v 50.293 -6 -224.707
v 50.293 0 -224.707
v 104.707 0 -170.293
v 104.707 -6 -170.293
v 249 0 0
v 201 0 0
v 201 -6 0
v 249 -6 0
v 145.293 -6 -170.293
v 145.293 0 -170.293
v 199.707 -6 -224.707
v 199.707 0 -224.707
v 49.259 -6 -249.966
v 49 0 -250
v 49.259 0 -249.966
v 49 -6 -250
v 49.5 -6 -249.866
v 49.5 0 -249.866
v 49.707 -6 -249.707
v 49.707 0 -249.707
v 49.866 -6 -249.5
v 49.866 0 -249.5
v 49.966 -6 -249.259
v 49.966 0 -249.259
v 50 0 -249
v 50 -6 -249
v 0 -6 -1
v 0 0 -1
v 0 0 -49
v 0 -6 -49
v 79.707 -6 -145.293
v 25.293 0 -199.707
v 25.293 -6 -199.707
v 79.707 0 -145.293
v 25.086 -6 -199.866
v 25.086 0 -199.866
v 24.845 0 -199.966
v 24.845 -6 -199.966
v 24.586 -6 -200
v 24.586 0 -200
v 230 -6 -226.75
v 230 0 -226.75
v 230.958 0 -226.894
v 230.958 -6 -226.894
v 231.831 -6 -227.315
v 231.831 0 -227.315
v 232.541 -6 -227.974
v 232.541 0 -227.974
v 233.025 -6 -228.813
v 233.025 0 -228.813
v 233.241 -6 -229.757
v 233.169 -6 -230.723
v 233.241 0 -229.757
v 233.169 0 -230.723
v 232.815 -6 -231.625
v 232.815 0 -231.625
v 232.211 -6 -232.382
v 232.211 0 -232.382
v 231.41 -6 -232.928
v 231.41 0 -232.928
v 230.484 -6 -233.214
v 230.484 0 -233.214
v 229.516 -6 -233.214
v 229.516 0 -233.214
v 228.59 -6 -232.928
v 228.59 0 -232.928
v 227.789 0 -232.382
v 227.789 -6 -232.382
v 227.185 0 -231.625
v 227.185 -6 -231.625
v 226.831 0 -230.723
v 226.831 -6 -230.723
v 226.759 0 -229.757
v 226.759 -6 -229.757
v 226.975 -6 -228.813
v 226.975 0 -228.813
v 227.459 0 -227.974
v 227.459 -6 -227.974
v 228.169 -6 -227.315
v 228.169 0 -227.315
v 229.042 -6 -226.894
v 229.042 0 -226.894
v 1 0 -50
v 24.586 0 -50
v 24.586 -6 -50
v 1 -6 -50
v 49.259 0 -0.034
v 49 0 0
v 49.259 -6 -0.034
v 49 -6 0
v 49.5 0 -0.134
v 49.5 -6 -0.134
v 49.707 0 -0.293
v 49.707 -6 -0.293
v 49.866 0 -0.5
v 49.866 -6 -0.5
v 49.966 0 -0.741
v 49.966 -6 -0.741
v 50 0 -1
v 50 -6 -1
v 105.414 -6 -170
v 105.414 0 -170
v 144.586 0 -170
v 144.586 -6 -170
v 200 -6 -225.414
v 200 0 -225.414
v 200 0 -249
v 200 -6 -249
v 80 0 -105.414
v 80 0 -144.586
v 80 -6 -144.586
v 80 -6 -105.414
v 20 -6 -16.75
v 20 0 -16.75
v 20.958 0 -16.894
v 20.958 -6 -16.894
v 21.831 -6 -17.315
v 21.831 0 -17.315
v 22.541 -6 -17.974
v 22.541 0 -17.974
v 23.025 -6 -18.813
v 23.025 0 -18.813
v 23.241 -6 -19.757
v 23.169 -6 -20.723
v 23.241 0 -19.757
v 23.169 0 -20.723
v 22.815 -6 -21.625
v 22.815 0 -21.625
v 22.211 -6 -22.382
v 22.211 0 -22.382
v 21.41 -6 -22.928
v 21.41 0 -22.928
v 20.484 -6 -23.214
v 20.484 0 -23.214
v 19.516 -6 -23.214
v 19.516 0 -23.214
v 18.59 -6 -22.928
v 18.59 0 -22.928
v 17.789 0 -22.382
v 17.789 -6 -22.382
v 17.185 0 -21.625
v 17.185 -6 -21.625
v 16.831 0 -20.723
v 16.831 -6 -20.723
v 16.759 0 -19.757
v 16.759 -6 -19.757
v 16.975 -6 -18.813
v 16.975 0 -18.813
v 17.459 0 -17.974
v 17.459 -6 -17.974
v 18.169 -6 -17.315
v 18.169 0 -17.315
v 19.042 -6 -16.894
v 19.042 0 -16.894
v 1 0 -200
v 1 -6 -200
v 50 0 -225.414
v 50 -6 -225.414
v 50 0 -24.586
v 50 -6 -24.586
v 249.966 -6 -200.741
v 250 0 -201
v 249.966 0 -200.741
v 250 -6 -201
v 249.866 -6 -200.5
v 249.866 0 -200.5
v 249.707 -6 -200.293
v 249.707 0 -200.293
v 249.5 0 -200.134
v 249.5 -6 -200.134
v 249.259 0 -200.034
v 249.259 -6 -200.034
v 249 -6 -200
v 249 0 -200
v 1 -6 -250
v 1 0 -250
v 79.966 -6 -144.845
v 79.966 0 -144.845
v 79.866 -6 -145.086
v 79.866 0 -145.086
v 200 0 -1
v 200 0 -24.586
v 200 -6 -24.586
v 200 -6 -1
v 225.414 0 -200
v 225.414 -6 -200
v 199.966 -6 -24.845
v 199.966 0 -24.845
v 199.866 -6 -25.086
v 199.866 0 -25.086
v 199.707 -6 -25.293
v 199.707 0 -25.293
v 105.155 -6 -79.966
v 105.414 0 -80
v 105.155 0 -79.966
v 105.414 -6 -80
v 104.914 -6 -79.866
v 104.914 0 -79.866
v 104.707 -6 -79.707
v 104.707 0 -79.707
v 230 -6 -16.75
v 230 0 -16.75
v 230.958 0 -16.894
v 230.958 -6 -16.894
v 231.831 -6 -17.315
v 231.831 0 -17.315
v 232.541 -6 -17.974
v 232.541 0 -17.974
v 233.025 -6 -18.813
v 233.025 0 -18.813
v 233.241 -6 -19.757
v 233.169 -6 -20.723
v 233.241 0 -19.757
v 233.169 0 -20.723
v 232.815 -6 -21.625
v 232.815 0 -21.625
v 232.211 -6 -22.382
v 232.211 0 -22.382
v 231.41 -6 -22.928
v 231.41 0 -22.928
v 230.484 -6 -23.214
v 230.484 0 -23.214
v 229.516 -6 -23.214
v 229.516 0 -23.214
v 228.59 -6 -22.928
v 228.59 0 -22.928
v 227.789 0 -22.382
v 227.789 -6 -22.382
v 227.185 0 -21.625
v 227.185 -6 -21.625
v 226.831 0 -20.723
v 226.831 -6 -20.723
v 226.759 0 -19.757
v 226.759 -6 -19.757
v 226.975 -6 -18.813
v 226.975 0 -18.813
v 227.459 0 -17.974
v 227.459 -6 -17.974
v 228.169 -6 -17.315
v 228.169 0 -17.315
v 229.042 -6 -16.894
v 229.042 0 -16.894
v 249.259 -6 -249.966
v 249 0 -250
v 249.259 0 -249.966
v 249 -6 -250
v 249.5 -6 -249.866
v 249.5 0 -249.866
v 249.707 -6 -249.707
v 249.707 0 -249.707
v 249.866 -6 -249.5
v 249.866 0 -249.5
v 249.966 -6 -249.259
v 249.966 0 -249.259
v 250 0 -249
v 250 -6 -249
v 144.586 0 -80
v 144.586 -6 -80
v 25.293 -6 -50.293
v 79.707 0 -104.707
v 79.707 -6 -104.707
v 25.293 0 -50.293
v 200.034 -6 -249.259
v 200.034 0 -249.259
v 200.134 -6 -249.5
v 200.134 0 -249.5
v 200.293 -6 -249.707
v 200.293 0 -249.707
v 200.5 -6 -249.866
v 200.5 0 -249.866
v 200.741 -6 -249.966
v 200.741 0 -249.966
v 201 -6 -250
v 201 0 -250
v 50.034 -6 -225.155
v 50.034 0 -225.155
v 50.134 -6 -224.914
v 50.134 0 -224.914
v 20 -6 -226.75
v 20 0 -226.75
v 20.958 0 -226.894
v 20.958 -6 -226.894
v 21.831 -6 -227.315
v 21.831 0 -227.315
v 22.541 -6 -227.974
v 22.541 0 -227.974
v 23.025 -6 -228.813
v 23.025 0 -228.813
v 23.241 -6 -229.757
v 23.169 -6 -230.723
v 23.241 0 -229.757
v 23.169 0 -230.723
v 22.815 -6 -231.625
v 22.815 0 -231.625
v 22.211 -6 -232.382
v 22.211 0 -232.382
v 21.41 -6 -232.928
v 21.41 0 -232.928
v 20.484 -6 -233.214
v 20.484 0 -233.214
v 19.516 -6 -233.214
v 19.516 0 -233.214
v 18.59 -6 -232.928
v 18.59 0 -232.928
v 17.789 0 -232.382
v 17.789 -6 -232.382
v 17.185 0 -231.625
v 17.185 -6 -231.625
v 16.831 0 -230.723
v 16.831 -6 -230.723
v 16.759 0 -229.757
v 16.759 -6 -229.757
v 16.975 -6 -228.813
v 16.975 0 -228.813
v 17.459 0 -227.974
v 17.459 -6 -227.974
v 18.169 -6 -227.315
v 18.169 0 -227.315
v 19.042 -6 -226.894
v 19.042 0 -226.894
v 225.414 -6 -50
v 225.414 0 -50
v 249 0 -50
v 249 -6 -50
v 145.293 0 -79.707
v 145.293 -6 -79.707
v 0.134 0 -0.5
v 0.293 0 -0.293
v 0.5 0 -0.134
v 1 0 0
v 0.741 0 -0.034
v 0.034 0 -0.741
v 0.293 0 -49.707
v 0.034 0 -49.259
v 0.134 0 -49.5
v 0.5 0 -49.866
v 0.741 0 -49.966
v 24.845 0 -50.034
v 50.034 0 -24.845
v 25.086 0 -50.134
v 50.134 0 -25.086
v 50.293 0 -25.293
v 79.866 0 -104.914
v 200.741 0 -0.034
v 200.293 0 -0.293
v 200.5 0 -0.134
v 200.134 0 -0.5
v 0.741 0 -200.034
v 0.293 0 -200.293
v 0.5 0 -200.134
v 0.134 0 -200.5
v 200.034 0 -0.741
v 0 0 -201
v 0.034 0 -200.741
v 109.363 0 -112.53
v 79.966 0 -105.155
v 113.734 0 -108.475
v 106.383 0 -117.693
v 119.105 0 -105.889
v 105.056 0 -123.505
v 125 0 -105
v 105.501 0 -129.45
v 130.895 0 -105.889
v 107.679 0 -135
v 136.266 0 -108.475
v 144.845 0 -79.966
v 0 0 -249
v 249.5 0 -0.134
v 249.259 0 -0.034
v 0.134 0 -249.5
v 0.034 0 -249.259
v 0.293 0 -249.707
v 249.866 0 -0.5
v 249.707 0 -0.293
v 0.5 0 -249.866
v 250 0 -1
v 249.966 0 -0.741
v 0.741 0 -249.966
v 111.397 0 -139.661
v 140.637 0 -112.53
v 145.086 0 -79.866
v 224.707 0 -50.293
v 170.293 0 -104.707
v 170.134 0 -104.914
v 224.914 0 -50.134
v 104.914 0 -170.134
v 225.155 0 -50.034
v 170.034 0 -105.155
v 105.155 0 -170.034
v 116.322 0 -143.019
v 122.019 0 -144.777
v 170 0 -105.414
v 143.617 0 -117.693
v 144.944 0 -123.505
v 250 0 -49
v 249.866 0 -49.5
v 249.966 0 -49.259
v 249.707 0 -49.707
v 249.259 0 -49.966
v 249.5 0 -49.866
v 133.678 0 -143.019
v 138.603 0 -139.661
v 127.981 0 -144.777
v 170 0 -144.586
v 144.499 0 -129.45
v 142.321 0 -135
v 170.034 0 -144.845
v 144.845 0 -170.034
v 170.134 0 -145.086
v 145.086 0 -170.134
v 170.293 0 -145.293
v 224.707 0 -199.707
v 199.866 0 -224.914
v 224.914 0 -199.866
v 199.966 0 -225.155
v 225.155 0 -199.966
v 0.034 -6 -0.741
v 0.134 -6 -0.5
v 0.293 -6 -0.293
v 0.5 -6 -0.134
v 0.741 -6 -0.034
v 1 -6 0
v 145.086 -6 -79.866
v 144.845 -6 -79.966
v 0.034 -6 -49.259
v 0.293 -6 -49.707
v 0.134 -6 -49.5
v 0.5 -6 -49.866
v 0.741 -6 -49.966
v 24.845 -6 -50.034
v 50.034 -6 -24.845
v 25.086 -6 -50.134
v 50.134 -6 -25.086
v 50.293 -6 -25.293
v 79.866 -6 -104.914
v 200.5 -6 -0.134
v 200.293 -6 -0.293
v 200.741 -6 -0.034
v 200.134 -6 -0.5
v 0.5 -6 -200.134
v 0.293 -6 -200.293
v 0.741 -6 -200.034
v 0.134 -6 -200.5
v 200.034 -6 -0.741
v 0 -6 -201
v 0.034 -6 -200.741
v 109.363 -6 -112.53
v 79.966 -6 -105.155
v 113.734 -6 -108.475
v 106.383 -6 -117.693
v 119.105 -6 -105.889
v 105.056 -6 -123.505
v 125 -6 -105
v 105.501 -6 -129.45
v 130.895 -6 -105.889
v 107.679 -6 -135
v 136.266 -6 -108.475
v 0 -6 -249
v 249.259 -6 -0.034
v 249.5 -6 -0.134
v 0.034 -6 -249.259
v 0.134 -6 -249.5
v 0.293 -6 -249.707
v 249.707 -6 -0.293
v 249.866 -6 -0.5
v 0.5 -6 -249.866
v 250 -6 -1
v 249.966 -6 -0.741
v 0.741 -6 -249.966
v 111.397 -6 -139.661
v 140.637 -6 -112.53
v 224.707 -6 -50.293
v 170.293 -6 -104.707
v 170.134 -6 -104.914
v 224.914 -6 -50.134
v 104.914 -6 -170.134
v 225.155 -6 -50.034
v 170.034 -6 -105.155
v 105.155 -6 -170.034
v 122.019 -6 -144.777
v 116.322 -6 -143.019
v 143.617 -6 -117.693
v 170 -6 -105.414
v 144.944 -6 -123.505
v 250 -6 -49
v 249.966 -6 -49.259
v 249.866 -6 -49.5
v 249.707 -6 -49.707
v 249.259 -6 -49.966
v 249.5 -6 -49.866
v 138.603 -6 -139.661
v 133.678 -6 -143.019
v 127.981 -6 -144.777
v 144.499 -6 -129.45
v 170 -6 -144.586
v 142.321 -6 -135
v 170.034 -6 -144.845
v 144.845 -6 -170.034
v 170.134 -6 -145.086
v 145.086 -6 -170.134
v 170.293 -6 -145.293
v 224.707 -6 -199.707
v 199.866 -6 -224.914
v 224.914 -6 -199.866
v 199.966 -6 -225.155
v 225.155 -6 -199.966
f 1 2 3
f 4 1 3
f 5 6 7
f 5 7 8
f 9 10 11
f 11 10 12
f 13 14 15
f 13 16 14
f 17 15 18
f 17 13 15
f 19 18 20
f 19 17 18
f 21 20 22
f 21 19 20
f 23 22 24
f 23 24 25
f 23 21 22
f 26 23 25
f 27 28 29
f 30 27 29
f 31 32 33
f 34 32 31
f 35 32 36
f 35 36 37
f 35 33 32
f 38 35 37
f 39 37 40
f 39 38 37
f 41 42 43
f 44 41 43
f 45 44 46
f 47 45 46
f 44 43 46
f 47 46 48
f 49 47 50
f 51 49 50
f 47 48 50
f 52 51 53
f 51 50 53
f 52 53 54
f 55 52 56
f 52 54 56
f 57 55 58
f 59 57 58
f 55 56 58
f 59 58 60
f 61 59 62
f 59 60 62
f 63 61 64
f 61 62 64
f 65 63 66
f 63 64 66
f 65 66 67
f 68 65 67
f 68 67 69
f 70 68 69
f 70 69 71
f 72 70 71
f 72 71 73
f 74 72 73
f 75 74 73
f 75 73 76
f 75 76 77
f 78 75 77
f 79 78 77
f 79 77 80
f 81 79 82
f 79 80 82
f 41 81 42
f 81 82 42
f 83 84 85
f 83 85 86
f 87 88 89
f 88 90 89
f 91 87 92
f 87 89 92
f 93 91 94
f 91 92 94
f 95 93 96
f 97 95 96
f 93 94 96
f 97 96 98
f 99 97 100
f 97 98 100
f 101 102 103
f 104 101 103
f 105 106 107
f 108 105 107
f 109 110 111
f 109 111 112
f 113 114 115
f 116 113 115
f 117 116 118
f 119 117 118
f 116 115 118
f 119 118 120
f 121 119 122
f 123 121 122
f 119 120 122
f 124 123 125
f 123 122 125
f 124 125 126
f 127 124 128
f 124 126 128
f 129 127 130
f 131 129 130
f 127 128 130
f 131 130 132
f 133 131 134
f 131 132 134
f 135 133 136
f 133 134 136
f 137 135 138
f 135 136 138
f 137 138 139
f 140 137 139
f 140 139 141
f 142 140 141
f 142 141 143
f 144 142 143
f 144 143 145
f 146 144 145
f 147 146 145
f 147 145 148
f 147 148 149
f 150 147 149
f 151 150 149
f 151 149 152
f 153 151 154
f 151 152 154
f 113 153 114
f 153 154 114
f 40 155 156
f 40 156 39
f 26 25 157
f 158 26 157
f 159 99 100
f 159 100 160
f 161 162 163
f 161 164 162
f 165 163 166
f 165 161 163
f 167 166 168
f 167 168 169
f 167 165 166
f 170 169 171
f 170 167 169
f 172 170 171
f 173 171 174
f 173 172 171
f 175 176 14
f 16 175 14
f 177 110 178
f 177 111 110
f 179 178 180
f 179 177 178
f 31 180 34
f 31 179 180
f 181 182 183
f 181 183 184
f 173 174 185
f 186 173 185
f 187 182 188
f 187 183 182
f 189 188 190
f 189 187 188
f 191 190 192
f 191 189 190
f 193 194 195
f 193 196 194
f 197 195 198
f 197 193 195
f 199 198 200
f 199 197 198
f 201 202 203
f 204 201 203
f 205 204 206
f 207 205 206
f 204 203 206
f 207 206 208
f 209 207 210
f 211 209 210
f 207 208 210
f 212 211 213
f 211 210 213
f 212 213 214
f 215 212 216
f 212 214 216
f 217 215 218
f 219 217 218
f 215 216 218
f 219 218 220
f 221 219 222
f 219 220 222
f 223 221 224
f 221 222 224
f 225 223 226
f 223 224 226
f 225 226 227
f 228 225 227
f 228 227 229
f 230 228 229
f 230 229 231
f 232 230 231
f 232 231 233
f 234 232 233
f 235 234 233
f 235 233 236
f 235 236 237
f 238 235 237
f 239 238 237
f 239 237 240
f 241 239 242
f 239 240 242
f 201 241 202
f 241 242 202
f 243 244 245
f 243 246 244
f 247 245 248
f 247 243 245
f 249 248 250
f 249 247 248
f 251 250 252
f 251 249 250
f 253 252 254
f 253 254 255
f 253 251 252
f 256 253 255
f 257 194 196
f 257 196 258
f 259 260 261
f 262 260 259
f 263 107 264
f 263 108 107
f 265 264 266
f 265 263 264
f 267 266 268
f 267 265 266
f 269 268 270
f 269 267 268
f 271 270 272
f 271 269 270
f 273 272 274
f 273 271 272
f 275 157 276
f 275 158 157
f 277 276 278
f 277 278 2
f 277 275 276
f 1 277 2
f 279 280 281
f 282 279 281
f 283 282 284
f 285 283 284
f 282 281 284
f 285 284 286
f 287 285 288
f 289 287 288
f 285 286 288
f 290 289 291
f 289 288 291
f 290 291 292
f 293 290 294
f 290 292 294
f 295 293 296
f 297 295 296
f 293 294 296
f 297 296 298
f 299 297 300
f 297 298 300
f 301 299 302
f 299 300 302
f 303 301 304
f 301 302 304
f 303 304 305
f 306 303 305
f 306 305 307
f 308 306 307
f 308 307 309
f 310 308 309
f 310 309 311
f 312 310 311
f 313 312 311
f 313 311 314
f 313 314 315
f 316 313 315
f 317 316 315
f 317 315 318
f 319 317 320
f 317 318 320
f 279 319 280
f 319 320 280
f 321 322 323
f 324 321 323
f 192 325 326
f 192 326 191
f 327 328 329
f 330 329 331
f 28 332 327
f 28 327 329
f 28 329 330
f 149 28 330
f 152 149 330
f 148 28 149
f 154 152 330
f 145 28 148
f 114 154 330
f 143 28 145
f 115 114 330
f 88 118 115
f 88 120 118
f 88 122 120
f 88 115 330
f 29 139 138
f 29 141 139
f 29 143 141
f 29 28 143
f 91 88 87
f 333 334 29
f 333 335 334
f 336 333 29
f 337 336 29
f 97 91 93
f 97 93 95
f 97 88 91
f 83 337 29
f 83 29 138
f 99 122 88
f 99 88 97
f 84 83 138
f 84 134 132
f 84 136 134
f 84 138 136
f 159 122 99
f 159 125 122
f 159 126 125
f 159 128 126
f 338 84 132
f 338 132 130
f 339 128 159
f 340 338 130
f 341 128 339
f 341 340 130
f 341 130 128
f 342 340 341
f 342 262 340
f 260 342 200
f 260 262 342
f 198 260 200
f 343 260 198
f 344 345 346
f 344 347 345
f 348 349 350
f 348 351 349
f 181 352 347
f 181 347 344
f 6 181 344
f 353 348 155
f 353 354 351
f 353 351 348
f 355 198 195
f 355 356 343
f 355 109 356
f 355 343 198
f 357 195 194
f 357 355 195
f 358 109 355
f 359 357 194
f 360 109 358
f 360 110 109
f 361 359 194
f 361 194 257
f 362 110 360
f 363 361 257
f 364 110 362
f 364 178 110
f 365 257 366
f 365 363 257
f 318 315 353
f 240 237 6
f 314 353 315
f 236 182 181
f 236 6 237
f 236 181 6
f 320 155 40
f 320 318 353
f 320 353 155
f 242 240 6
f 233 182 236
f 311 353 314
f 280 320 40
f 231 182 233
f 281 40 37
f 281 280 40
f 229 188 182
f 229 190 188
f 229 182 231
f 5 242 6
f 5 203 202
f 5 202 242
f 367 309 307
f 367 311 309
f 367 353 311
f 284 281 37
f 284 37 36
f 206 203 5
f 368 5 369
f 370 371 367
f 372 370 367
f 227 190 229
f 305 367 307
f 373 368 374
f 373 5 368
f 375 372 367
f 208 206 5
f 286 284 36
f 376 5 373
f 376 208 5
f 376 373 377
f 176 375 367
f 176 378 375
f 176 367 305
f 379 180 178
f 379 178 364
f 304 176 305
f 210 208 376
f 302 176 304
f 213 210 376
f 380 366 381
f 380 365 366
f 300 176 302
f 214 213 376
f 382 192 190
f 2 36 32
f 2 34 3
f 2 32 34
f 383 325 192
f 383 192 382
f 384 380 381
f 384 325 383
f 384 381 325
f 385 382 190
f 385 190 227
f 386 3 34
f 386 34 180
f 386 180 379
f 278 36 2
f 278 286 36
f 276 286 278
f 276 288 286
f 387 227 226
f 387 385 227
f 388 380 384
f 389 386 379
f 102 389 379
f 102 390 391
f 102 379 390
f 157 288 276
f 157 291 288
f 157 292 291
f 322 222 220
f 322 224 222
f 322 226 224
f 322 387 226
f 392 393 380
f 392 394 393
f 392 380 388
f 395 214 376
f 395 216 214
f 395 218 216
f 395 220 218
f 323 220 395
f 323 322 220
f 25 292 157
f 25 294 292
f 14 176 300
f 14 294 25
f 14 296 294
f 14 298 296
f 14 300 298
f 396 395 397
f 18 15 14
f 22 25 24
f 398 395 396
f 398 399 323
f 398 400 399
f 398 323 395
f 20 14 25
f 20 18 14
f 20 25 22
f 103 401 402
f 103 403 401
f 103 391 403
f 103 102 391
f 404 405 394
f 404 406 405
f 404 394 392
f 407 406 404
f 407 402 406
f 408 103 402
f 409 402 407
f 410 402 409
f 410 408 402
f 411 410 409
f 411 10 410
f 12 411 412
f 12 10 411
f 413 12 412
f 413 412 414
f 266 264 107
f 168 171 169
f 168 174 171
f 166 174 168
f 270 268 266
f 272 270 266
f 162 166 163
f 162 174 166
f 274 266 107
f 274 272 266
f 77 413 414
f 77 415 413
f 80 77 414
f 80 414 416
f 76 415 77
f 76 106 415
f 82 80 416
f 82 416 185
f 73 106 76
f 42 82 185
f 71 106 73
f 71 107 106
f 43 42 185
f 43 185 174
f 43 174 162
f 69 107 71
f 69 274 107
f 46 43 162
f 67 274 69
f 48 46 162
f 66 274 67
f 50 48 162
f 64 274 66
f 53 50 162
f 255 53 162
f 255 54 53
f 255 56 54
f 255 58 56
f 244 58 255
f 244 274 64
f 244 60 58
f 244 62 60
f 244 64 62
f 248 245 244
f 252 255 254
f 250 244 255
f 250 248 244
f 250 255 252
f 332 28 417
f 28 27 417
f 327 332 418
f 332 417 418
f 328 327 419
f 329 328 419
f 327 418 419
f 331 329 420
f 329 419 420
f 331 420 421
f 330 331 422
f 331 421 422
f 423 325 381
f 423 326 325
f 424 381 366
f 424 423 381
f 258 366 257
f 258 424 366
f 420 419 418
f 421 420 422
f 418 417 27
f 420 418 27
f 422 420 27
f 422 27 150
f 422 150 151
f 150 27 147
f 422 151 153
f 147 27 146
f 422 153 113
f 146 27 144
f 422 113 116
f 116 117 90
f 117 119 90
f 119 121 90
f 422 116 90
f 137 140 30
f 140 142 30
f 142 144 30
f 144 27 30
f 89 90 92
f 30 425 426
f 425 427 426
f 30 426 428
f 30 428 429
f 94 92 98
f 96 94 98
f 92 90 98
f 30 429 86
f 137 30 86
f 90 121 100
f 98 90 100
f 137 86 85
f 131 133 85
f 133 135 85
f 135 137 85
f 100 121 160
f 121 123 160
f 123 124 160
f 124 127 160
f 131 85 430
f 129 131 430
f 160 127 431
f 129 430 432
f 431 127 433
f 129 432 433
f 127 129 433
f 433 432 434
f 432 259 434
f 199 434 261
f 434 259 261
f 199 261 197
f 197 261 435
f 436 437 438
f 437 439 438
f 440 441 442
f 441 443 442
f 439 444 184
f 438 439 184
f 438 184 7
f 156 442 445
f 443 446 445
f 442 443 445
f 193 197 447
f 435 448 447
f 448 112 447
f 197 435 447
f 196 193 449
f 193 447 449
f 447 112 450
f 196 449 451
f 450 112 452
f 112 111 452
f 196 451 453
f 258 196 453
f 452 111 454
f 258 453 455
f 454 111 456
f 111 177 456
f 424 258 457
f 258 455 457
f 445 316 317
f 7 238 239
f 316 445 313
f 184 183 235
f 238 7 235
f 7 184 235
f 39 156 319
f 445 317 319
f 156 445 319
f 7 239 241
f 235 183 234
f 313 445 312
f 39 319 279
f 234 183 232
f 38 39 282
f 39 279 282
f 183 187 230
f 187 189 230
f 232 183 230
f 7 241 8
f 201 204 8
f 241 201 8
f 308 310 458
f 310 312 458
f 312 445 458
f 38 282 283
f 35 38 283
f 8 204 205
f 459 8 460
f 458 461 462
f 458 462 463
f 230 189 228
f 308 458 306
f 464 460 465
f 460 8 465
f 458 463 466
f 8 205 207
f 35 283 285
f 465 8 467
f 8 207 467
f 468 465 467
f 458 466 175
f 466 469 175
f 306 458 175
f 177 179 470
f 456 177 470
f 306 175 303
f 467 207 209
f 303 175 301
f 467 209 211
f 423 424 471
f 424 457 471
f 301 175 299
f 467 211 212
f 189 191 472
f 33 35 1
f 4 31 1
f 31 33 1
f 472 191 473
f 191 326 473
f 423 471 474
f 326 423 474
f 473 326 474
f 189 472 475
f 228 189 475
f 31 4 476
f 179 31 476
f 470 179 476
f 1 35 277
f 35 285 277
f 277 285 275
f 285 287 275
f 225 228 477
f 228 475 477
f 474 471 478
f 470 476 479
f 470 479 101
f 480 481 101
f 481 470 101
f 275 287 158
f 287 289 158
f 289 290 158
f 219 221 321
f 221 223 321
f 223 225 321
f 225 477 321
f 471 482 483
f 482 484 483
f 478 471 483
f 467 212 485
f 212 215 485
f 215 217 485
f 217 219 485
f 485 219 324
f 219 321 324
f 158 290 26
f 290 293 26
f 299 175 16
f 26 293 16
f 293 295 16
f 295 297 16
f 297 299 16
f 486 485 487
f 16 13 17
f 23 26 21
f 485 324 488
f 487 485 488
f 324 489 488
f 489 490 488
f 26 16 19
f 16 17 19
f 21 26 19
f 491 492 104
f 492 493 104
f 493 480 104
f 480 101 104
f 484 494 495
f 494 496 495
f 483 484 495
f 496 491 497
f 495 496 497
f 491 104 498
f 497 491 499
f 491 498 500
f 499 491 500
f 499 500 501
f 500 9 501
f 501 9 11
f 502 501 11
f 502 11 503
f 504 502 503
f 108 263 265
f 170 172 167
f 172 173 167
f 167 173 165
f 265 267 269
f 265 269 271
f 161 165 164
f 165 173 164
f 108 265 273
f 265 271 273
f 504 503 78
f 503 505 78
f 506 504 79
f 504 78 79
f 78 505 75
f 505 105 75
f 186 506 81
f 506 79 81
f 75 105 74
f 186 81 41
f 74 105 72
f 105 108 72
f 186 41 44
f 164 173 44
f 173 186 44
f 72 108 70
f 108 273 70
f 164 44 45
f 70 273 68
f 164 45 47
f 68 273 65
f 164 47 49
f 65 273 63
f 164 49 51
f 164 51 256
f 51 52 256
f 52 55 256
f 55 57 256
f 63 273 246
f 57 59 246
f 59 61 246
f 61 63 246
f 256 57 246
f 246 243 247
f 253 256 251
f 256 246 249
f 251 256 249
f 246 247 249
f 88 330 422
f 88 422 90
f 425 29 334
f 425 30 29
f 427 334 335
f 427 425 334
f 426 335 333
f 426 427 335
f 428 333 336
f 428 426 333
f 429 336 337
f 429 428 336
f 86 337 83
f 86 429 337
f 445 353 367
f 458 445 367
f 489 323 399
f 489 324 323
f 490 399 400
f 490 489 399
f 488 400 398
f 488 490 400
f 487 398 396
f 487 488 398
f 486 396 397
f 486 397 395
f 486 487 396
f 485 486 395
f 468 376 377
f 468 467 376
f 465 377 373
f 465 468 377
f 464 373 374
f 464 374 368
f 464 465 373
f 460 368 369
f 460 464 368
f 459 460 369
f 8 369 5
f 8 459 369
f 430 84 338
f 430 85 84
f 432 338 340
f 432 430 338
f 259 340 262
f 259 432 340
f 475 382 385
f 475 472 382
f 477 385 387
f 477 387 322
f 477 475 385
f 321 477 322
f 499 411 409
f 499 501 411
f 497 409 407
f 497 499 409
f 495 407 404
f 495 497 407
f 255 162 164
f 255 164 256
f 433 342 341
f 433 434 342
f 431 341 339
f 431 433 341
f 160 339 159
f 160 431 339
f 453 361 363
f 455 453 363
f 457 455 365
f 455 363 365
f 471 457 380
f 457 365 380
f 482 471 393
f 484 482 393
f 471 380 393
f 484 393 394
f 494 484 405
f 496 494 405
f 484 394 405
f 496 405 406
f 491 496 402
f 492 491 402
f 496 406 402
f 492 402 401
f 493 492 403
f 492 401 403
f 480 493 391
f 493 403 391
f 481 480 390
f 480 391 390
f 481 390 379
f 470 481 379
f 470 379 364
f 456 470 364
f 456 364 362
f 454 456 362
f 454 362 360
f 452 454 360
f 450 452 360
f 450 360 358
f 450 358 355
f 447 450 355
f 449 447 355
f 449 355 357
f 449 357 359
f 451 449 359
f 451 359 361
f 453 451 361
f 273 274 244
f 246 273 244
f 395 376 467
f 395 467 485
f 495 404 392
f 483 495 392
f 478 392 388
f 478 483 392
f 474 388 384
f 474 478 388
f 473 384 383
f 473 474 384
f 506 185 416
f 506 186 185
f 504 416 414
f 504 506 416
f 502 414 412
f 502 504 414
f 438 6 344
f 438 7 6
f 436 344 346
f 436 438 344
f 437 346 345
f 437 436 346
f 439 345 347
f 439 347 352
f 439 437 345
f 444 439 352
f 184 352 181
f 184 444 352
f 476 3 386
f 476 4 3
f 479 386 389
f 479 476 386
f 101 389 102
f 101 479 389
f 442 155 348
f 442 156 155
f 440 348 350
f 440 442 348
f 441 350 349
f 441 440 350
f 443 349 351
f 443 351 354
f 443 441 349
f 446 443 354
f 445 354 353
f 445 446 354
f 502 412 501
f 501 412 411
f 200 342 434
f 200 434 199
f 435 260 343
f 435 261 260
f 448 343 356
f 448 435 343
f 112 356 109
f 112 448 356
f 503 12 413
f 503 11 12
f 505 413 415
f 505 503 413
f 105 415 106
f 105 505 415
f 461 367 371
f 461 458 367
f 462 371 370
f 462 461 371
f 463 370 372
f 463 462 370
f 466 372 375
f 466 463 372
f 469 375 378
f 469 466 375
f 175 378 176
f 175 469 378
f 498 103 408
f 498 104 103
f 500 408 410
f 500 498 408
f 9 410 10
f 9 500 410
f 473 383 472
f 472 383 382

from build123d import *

# Parameters (mm, degrees)
SKETCH1_W   = 250
SKETCH1_H   = 250
TABLE_DEPTH = 6
SKETCH2_R   = 3.25
CUT_DEPTH   = 6
FILLET1_R   = 1
SKETCH3_R   = 20
LITE_DEPTH  = 354.604298616


with BuildPart() as part:
    # Sketch1 → table (new body)
    with BuildSketch(Plane(origin=(0, 0, 0), x_dir=(1, 0, 0), z_dir=(0, 1, 0))):
        with Locations((125, 125)):
            Rectangle(SKETCH1_W, SKETCH1_H)
    extrude(amount=-TABLE_DEPTH)

    # Sketch2 → cut (cut)
    with BuildSketch(Plane(origin=(0, 0, 0), x_dir=(1, 0, 0), z_dir=(0, 1, 0))):
        with Locations(Location((20, 230, 0), (0, 0, 270))):
            Circle(SKETCH2_R)
        with Locations(Location((230, 230, 0), (0, 0, 270))):
            Circle(SKETCH2_R)
        with Locations(Location((230, 20, 0), (0, 0, 270))):
            Circle(SKETCH2_R)
        with Locations(Location((20, 20, 0), (0, 0, 270))):
            Circle(SKETCH2_R)
        Polygon((0, 200), (25, 200), (80, 145), (80, 105), (25, 50), (0, 50), align=None)
        Polygon((50, 250), (50, 225), (105, 170), (145, 170), (200, 225), (200, 250), align=None)
        Polygon((250, 200), (225, 200), (170, 145), (170, 105), (225, 50), (250, 50), align=None)
        Polygon((50, 0), (50, 25), (105, 80), (145, 80), (200, 25), (200, 0), align=None)
    extrude(amount=-CUT_DEPTH, mode=Mode.SUBTRACT)

    # Fillet1
    fillet1_edges = [part.edges().sort_by_distance(p)[0] for p in [
        (0, -3, -50),
        (0, -3, -200),
        (25, -3, -200),
        (80, -3, -145),
        (80, -3, -105),
        (25, -3, -50),
        (50, -3, -250),
        (200, -3, -250),
        (200, -3, -225),
        (145, -3, -170),
        (105, -3, -170),
        (50, -3, -225),
        (250, -3, -200),
        (250, -3, -50),
        (225, -3, -50),
        (170, -3, -105),
        (170, -3, -145),
        (225, -3, -200),
        (0, -3, -250),
        (250, -3, -250),
        (250, -3, 0),
        (0, -3, 0),
        (200, -3, 0),
        (50, -3, 0),
        (50, -3, -25),
        (105, -3, -80),
        (145, -3, -80),
        (200, -3, -25),
    ]]
    fillet(fillet1_edges, radius=FILLET1_R)

    # Sketch3 → lite (cut, through all)
    with BuildSketch(Plane(origin=(0, 0, 0), x_dir=(1, 0, 0), z_dir=(0, 1, 0))):
        with Locations(Location((125, 125, 0), (0, 0, 270))):
            Circle(SKETCH3_R)
    extrude(amount=-LITE_DEPTH, mode=Mode.SUBTRACT)


solid = part.part
